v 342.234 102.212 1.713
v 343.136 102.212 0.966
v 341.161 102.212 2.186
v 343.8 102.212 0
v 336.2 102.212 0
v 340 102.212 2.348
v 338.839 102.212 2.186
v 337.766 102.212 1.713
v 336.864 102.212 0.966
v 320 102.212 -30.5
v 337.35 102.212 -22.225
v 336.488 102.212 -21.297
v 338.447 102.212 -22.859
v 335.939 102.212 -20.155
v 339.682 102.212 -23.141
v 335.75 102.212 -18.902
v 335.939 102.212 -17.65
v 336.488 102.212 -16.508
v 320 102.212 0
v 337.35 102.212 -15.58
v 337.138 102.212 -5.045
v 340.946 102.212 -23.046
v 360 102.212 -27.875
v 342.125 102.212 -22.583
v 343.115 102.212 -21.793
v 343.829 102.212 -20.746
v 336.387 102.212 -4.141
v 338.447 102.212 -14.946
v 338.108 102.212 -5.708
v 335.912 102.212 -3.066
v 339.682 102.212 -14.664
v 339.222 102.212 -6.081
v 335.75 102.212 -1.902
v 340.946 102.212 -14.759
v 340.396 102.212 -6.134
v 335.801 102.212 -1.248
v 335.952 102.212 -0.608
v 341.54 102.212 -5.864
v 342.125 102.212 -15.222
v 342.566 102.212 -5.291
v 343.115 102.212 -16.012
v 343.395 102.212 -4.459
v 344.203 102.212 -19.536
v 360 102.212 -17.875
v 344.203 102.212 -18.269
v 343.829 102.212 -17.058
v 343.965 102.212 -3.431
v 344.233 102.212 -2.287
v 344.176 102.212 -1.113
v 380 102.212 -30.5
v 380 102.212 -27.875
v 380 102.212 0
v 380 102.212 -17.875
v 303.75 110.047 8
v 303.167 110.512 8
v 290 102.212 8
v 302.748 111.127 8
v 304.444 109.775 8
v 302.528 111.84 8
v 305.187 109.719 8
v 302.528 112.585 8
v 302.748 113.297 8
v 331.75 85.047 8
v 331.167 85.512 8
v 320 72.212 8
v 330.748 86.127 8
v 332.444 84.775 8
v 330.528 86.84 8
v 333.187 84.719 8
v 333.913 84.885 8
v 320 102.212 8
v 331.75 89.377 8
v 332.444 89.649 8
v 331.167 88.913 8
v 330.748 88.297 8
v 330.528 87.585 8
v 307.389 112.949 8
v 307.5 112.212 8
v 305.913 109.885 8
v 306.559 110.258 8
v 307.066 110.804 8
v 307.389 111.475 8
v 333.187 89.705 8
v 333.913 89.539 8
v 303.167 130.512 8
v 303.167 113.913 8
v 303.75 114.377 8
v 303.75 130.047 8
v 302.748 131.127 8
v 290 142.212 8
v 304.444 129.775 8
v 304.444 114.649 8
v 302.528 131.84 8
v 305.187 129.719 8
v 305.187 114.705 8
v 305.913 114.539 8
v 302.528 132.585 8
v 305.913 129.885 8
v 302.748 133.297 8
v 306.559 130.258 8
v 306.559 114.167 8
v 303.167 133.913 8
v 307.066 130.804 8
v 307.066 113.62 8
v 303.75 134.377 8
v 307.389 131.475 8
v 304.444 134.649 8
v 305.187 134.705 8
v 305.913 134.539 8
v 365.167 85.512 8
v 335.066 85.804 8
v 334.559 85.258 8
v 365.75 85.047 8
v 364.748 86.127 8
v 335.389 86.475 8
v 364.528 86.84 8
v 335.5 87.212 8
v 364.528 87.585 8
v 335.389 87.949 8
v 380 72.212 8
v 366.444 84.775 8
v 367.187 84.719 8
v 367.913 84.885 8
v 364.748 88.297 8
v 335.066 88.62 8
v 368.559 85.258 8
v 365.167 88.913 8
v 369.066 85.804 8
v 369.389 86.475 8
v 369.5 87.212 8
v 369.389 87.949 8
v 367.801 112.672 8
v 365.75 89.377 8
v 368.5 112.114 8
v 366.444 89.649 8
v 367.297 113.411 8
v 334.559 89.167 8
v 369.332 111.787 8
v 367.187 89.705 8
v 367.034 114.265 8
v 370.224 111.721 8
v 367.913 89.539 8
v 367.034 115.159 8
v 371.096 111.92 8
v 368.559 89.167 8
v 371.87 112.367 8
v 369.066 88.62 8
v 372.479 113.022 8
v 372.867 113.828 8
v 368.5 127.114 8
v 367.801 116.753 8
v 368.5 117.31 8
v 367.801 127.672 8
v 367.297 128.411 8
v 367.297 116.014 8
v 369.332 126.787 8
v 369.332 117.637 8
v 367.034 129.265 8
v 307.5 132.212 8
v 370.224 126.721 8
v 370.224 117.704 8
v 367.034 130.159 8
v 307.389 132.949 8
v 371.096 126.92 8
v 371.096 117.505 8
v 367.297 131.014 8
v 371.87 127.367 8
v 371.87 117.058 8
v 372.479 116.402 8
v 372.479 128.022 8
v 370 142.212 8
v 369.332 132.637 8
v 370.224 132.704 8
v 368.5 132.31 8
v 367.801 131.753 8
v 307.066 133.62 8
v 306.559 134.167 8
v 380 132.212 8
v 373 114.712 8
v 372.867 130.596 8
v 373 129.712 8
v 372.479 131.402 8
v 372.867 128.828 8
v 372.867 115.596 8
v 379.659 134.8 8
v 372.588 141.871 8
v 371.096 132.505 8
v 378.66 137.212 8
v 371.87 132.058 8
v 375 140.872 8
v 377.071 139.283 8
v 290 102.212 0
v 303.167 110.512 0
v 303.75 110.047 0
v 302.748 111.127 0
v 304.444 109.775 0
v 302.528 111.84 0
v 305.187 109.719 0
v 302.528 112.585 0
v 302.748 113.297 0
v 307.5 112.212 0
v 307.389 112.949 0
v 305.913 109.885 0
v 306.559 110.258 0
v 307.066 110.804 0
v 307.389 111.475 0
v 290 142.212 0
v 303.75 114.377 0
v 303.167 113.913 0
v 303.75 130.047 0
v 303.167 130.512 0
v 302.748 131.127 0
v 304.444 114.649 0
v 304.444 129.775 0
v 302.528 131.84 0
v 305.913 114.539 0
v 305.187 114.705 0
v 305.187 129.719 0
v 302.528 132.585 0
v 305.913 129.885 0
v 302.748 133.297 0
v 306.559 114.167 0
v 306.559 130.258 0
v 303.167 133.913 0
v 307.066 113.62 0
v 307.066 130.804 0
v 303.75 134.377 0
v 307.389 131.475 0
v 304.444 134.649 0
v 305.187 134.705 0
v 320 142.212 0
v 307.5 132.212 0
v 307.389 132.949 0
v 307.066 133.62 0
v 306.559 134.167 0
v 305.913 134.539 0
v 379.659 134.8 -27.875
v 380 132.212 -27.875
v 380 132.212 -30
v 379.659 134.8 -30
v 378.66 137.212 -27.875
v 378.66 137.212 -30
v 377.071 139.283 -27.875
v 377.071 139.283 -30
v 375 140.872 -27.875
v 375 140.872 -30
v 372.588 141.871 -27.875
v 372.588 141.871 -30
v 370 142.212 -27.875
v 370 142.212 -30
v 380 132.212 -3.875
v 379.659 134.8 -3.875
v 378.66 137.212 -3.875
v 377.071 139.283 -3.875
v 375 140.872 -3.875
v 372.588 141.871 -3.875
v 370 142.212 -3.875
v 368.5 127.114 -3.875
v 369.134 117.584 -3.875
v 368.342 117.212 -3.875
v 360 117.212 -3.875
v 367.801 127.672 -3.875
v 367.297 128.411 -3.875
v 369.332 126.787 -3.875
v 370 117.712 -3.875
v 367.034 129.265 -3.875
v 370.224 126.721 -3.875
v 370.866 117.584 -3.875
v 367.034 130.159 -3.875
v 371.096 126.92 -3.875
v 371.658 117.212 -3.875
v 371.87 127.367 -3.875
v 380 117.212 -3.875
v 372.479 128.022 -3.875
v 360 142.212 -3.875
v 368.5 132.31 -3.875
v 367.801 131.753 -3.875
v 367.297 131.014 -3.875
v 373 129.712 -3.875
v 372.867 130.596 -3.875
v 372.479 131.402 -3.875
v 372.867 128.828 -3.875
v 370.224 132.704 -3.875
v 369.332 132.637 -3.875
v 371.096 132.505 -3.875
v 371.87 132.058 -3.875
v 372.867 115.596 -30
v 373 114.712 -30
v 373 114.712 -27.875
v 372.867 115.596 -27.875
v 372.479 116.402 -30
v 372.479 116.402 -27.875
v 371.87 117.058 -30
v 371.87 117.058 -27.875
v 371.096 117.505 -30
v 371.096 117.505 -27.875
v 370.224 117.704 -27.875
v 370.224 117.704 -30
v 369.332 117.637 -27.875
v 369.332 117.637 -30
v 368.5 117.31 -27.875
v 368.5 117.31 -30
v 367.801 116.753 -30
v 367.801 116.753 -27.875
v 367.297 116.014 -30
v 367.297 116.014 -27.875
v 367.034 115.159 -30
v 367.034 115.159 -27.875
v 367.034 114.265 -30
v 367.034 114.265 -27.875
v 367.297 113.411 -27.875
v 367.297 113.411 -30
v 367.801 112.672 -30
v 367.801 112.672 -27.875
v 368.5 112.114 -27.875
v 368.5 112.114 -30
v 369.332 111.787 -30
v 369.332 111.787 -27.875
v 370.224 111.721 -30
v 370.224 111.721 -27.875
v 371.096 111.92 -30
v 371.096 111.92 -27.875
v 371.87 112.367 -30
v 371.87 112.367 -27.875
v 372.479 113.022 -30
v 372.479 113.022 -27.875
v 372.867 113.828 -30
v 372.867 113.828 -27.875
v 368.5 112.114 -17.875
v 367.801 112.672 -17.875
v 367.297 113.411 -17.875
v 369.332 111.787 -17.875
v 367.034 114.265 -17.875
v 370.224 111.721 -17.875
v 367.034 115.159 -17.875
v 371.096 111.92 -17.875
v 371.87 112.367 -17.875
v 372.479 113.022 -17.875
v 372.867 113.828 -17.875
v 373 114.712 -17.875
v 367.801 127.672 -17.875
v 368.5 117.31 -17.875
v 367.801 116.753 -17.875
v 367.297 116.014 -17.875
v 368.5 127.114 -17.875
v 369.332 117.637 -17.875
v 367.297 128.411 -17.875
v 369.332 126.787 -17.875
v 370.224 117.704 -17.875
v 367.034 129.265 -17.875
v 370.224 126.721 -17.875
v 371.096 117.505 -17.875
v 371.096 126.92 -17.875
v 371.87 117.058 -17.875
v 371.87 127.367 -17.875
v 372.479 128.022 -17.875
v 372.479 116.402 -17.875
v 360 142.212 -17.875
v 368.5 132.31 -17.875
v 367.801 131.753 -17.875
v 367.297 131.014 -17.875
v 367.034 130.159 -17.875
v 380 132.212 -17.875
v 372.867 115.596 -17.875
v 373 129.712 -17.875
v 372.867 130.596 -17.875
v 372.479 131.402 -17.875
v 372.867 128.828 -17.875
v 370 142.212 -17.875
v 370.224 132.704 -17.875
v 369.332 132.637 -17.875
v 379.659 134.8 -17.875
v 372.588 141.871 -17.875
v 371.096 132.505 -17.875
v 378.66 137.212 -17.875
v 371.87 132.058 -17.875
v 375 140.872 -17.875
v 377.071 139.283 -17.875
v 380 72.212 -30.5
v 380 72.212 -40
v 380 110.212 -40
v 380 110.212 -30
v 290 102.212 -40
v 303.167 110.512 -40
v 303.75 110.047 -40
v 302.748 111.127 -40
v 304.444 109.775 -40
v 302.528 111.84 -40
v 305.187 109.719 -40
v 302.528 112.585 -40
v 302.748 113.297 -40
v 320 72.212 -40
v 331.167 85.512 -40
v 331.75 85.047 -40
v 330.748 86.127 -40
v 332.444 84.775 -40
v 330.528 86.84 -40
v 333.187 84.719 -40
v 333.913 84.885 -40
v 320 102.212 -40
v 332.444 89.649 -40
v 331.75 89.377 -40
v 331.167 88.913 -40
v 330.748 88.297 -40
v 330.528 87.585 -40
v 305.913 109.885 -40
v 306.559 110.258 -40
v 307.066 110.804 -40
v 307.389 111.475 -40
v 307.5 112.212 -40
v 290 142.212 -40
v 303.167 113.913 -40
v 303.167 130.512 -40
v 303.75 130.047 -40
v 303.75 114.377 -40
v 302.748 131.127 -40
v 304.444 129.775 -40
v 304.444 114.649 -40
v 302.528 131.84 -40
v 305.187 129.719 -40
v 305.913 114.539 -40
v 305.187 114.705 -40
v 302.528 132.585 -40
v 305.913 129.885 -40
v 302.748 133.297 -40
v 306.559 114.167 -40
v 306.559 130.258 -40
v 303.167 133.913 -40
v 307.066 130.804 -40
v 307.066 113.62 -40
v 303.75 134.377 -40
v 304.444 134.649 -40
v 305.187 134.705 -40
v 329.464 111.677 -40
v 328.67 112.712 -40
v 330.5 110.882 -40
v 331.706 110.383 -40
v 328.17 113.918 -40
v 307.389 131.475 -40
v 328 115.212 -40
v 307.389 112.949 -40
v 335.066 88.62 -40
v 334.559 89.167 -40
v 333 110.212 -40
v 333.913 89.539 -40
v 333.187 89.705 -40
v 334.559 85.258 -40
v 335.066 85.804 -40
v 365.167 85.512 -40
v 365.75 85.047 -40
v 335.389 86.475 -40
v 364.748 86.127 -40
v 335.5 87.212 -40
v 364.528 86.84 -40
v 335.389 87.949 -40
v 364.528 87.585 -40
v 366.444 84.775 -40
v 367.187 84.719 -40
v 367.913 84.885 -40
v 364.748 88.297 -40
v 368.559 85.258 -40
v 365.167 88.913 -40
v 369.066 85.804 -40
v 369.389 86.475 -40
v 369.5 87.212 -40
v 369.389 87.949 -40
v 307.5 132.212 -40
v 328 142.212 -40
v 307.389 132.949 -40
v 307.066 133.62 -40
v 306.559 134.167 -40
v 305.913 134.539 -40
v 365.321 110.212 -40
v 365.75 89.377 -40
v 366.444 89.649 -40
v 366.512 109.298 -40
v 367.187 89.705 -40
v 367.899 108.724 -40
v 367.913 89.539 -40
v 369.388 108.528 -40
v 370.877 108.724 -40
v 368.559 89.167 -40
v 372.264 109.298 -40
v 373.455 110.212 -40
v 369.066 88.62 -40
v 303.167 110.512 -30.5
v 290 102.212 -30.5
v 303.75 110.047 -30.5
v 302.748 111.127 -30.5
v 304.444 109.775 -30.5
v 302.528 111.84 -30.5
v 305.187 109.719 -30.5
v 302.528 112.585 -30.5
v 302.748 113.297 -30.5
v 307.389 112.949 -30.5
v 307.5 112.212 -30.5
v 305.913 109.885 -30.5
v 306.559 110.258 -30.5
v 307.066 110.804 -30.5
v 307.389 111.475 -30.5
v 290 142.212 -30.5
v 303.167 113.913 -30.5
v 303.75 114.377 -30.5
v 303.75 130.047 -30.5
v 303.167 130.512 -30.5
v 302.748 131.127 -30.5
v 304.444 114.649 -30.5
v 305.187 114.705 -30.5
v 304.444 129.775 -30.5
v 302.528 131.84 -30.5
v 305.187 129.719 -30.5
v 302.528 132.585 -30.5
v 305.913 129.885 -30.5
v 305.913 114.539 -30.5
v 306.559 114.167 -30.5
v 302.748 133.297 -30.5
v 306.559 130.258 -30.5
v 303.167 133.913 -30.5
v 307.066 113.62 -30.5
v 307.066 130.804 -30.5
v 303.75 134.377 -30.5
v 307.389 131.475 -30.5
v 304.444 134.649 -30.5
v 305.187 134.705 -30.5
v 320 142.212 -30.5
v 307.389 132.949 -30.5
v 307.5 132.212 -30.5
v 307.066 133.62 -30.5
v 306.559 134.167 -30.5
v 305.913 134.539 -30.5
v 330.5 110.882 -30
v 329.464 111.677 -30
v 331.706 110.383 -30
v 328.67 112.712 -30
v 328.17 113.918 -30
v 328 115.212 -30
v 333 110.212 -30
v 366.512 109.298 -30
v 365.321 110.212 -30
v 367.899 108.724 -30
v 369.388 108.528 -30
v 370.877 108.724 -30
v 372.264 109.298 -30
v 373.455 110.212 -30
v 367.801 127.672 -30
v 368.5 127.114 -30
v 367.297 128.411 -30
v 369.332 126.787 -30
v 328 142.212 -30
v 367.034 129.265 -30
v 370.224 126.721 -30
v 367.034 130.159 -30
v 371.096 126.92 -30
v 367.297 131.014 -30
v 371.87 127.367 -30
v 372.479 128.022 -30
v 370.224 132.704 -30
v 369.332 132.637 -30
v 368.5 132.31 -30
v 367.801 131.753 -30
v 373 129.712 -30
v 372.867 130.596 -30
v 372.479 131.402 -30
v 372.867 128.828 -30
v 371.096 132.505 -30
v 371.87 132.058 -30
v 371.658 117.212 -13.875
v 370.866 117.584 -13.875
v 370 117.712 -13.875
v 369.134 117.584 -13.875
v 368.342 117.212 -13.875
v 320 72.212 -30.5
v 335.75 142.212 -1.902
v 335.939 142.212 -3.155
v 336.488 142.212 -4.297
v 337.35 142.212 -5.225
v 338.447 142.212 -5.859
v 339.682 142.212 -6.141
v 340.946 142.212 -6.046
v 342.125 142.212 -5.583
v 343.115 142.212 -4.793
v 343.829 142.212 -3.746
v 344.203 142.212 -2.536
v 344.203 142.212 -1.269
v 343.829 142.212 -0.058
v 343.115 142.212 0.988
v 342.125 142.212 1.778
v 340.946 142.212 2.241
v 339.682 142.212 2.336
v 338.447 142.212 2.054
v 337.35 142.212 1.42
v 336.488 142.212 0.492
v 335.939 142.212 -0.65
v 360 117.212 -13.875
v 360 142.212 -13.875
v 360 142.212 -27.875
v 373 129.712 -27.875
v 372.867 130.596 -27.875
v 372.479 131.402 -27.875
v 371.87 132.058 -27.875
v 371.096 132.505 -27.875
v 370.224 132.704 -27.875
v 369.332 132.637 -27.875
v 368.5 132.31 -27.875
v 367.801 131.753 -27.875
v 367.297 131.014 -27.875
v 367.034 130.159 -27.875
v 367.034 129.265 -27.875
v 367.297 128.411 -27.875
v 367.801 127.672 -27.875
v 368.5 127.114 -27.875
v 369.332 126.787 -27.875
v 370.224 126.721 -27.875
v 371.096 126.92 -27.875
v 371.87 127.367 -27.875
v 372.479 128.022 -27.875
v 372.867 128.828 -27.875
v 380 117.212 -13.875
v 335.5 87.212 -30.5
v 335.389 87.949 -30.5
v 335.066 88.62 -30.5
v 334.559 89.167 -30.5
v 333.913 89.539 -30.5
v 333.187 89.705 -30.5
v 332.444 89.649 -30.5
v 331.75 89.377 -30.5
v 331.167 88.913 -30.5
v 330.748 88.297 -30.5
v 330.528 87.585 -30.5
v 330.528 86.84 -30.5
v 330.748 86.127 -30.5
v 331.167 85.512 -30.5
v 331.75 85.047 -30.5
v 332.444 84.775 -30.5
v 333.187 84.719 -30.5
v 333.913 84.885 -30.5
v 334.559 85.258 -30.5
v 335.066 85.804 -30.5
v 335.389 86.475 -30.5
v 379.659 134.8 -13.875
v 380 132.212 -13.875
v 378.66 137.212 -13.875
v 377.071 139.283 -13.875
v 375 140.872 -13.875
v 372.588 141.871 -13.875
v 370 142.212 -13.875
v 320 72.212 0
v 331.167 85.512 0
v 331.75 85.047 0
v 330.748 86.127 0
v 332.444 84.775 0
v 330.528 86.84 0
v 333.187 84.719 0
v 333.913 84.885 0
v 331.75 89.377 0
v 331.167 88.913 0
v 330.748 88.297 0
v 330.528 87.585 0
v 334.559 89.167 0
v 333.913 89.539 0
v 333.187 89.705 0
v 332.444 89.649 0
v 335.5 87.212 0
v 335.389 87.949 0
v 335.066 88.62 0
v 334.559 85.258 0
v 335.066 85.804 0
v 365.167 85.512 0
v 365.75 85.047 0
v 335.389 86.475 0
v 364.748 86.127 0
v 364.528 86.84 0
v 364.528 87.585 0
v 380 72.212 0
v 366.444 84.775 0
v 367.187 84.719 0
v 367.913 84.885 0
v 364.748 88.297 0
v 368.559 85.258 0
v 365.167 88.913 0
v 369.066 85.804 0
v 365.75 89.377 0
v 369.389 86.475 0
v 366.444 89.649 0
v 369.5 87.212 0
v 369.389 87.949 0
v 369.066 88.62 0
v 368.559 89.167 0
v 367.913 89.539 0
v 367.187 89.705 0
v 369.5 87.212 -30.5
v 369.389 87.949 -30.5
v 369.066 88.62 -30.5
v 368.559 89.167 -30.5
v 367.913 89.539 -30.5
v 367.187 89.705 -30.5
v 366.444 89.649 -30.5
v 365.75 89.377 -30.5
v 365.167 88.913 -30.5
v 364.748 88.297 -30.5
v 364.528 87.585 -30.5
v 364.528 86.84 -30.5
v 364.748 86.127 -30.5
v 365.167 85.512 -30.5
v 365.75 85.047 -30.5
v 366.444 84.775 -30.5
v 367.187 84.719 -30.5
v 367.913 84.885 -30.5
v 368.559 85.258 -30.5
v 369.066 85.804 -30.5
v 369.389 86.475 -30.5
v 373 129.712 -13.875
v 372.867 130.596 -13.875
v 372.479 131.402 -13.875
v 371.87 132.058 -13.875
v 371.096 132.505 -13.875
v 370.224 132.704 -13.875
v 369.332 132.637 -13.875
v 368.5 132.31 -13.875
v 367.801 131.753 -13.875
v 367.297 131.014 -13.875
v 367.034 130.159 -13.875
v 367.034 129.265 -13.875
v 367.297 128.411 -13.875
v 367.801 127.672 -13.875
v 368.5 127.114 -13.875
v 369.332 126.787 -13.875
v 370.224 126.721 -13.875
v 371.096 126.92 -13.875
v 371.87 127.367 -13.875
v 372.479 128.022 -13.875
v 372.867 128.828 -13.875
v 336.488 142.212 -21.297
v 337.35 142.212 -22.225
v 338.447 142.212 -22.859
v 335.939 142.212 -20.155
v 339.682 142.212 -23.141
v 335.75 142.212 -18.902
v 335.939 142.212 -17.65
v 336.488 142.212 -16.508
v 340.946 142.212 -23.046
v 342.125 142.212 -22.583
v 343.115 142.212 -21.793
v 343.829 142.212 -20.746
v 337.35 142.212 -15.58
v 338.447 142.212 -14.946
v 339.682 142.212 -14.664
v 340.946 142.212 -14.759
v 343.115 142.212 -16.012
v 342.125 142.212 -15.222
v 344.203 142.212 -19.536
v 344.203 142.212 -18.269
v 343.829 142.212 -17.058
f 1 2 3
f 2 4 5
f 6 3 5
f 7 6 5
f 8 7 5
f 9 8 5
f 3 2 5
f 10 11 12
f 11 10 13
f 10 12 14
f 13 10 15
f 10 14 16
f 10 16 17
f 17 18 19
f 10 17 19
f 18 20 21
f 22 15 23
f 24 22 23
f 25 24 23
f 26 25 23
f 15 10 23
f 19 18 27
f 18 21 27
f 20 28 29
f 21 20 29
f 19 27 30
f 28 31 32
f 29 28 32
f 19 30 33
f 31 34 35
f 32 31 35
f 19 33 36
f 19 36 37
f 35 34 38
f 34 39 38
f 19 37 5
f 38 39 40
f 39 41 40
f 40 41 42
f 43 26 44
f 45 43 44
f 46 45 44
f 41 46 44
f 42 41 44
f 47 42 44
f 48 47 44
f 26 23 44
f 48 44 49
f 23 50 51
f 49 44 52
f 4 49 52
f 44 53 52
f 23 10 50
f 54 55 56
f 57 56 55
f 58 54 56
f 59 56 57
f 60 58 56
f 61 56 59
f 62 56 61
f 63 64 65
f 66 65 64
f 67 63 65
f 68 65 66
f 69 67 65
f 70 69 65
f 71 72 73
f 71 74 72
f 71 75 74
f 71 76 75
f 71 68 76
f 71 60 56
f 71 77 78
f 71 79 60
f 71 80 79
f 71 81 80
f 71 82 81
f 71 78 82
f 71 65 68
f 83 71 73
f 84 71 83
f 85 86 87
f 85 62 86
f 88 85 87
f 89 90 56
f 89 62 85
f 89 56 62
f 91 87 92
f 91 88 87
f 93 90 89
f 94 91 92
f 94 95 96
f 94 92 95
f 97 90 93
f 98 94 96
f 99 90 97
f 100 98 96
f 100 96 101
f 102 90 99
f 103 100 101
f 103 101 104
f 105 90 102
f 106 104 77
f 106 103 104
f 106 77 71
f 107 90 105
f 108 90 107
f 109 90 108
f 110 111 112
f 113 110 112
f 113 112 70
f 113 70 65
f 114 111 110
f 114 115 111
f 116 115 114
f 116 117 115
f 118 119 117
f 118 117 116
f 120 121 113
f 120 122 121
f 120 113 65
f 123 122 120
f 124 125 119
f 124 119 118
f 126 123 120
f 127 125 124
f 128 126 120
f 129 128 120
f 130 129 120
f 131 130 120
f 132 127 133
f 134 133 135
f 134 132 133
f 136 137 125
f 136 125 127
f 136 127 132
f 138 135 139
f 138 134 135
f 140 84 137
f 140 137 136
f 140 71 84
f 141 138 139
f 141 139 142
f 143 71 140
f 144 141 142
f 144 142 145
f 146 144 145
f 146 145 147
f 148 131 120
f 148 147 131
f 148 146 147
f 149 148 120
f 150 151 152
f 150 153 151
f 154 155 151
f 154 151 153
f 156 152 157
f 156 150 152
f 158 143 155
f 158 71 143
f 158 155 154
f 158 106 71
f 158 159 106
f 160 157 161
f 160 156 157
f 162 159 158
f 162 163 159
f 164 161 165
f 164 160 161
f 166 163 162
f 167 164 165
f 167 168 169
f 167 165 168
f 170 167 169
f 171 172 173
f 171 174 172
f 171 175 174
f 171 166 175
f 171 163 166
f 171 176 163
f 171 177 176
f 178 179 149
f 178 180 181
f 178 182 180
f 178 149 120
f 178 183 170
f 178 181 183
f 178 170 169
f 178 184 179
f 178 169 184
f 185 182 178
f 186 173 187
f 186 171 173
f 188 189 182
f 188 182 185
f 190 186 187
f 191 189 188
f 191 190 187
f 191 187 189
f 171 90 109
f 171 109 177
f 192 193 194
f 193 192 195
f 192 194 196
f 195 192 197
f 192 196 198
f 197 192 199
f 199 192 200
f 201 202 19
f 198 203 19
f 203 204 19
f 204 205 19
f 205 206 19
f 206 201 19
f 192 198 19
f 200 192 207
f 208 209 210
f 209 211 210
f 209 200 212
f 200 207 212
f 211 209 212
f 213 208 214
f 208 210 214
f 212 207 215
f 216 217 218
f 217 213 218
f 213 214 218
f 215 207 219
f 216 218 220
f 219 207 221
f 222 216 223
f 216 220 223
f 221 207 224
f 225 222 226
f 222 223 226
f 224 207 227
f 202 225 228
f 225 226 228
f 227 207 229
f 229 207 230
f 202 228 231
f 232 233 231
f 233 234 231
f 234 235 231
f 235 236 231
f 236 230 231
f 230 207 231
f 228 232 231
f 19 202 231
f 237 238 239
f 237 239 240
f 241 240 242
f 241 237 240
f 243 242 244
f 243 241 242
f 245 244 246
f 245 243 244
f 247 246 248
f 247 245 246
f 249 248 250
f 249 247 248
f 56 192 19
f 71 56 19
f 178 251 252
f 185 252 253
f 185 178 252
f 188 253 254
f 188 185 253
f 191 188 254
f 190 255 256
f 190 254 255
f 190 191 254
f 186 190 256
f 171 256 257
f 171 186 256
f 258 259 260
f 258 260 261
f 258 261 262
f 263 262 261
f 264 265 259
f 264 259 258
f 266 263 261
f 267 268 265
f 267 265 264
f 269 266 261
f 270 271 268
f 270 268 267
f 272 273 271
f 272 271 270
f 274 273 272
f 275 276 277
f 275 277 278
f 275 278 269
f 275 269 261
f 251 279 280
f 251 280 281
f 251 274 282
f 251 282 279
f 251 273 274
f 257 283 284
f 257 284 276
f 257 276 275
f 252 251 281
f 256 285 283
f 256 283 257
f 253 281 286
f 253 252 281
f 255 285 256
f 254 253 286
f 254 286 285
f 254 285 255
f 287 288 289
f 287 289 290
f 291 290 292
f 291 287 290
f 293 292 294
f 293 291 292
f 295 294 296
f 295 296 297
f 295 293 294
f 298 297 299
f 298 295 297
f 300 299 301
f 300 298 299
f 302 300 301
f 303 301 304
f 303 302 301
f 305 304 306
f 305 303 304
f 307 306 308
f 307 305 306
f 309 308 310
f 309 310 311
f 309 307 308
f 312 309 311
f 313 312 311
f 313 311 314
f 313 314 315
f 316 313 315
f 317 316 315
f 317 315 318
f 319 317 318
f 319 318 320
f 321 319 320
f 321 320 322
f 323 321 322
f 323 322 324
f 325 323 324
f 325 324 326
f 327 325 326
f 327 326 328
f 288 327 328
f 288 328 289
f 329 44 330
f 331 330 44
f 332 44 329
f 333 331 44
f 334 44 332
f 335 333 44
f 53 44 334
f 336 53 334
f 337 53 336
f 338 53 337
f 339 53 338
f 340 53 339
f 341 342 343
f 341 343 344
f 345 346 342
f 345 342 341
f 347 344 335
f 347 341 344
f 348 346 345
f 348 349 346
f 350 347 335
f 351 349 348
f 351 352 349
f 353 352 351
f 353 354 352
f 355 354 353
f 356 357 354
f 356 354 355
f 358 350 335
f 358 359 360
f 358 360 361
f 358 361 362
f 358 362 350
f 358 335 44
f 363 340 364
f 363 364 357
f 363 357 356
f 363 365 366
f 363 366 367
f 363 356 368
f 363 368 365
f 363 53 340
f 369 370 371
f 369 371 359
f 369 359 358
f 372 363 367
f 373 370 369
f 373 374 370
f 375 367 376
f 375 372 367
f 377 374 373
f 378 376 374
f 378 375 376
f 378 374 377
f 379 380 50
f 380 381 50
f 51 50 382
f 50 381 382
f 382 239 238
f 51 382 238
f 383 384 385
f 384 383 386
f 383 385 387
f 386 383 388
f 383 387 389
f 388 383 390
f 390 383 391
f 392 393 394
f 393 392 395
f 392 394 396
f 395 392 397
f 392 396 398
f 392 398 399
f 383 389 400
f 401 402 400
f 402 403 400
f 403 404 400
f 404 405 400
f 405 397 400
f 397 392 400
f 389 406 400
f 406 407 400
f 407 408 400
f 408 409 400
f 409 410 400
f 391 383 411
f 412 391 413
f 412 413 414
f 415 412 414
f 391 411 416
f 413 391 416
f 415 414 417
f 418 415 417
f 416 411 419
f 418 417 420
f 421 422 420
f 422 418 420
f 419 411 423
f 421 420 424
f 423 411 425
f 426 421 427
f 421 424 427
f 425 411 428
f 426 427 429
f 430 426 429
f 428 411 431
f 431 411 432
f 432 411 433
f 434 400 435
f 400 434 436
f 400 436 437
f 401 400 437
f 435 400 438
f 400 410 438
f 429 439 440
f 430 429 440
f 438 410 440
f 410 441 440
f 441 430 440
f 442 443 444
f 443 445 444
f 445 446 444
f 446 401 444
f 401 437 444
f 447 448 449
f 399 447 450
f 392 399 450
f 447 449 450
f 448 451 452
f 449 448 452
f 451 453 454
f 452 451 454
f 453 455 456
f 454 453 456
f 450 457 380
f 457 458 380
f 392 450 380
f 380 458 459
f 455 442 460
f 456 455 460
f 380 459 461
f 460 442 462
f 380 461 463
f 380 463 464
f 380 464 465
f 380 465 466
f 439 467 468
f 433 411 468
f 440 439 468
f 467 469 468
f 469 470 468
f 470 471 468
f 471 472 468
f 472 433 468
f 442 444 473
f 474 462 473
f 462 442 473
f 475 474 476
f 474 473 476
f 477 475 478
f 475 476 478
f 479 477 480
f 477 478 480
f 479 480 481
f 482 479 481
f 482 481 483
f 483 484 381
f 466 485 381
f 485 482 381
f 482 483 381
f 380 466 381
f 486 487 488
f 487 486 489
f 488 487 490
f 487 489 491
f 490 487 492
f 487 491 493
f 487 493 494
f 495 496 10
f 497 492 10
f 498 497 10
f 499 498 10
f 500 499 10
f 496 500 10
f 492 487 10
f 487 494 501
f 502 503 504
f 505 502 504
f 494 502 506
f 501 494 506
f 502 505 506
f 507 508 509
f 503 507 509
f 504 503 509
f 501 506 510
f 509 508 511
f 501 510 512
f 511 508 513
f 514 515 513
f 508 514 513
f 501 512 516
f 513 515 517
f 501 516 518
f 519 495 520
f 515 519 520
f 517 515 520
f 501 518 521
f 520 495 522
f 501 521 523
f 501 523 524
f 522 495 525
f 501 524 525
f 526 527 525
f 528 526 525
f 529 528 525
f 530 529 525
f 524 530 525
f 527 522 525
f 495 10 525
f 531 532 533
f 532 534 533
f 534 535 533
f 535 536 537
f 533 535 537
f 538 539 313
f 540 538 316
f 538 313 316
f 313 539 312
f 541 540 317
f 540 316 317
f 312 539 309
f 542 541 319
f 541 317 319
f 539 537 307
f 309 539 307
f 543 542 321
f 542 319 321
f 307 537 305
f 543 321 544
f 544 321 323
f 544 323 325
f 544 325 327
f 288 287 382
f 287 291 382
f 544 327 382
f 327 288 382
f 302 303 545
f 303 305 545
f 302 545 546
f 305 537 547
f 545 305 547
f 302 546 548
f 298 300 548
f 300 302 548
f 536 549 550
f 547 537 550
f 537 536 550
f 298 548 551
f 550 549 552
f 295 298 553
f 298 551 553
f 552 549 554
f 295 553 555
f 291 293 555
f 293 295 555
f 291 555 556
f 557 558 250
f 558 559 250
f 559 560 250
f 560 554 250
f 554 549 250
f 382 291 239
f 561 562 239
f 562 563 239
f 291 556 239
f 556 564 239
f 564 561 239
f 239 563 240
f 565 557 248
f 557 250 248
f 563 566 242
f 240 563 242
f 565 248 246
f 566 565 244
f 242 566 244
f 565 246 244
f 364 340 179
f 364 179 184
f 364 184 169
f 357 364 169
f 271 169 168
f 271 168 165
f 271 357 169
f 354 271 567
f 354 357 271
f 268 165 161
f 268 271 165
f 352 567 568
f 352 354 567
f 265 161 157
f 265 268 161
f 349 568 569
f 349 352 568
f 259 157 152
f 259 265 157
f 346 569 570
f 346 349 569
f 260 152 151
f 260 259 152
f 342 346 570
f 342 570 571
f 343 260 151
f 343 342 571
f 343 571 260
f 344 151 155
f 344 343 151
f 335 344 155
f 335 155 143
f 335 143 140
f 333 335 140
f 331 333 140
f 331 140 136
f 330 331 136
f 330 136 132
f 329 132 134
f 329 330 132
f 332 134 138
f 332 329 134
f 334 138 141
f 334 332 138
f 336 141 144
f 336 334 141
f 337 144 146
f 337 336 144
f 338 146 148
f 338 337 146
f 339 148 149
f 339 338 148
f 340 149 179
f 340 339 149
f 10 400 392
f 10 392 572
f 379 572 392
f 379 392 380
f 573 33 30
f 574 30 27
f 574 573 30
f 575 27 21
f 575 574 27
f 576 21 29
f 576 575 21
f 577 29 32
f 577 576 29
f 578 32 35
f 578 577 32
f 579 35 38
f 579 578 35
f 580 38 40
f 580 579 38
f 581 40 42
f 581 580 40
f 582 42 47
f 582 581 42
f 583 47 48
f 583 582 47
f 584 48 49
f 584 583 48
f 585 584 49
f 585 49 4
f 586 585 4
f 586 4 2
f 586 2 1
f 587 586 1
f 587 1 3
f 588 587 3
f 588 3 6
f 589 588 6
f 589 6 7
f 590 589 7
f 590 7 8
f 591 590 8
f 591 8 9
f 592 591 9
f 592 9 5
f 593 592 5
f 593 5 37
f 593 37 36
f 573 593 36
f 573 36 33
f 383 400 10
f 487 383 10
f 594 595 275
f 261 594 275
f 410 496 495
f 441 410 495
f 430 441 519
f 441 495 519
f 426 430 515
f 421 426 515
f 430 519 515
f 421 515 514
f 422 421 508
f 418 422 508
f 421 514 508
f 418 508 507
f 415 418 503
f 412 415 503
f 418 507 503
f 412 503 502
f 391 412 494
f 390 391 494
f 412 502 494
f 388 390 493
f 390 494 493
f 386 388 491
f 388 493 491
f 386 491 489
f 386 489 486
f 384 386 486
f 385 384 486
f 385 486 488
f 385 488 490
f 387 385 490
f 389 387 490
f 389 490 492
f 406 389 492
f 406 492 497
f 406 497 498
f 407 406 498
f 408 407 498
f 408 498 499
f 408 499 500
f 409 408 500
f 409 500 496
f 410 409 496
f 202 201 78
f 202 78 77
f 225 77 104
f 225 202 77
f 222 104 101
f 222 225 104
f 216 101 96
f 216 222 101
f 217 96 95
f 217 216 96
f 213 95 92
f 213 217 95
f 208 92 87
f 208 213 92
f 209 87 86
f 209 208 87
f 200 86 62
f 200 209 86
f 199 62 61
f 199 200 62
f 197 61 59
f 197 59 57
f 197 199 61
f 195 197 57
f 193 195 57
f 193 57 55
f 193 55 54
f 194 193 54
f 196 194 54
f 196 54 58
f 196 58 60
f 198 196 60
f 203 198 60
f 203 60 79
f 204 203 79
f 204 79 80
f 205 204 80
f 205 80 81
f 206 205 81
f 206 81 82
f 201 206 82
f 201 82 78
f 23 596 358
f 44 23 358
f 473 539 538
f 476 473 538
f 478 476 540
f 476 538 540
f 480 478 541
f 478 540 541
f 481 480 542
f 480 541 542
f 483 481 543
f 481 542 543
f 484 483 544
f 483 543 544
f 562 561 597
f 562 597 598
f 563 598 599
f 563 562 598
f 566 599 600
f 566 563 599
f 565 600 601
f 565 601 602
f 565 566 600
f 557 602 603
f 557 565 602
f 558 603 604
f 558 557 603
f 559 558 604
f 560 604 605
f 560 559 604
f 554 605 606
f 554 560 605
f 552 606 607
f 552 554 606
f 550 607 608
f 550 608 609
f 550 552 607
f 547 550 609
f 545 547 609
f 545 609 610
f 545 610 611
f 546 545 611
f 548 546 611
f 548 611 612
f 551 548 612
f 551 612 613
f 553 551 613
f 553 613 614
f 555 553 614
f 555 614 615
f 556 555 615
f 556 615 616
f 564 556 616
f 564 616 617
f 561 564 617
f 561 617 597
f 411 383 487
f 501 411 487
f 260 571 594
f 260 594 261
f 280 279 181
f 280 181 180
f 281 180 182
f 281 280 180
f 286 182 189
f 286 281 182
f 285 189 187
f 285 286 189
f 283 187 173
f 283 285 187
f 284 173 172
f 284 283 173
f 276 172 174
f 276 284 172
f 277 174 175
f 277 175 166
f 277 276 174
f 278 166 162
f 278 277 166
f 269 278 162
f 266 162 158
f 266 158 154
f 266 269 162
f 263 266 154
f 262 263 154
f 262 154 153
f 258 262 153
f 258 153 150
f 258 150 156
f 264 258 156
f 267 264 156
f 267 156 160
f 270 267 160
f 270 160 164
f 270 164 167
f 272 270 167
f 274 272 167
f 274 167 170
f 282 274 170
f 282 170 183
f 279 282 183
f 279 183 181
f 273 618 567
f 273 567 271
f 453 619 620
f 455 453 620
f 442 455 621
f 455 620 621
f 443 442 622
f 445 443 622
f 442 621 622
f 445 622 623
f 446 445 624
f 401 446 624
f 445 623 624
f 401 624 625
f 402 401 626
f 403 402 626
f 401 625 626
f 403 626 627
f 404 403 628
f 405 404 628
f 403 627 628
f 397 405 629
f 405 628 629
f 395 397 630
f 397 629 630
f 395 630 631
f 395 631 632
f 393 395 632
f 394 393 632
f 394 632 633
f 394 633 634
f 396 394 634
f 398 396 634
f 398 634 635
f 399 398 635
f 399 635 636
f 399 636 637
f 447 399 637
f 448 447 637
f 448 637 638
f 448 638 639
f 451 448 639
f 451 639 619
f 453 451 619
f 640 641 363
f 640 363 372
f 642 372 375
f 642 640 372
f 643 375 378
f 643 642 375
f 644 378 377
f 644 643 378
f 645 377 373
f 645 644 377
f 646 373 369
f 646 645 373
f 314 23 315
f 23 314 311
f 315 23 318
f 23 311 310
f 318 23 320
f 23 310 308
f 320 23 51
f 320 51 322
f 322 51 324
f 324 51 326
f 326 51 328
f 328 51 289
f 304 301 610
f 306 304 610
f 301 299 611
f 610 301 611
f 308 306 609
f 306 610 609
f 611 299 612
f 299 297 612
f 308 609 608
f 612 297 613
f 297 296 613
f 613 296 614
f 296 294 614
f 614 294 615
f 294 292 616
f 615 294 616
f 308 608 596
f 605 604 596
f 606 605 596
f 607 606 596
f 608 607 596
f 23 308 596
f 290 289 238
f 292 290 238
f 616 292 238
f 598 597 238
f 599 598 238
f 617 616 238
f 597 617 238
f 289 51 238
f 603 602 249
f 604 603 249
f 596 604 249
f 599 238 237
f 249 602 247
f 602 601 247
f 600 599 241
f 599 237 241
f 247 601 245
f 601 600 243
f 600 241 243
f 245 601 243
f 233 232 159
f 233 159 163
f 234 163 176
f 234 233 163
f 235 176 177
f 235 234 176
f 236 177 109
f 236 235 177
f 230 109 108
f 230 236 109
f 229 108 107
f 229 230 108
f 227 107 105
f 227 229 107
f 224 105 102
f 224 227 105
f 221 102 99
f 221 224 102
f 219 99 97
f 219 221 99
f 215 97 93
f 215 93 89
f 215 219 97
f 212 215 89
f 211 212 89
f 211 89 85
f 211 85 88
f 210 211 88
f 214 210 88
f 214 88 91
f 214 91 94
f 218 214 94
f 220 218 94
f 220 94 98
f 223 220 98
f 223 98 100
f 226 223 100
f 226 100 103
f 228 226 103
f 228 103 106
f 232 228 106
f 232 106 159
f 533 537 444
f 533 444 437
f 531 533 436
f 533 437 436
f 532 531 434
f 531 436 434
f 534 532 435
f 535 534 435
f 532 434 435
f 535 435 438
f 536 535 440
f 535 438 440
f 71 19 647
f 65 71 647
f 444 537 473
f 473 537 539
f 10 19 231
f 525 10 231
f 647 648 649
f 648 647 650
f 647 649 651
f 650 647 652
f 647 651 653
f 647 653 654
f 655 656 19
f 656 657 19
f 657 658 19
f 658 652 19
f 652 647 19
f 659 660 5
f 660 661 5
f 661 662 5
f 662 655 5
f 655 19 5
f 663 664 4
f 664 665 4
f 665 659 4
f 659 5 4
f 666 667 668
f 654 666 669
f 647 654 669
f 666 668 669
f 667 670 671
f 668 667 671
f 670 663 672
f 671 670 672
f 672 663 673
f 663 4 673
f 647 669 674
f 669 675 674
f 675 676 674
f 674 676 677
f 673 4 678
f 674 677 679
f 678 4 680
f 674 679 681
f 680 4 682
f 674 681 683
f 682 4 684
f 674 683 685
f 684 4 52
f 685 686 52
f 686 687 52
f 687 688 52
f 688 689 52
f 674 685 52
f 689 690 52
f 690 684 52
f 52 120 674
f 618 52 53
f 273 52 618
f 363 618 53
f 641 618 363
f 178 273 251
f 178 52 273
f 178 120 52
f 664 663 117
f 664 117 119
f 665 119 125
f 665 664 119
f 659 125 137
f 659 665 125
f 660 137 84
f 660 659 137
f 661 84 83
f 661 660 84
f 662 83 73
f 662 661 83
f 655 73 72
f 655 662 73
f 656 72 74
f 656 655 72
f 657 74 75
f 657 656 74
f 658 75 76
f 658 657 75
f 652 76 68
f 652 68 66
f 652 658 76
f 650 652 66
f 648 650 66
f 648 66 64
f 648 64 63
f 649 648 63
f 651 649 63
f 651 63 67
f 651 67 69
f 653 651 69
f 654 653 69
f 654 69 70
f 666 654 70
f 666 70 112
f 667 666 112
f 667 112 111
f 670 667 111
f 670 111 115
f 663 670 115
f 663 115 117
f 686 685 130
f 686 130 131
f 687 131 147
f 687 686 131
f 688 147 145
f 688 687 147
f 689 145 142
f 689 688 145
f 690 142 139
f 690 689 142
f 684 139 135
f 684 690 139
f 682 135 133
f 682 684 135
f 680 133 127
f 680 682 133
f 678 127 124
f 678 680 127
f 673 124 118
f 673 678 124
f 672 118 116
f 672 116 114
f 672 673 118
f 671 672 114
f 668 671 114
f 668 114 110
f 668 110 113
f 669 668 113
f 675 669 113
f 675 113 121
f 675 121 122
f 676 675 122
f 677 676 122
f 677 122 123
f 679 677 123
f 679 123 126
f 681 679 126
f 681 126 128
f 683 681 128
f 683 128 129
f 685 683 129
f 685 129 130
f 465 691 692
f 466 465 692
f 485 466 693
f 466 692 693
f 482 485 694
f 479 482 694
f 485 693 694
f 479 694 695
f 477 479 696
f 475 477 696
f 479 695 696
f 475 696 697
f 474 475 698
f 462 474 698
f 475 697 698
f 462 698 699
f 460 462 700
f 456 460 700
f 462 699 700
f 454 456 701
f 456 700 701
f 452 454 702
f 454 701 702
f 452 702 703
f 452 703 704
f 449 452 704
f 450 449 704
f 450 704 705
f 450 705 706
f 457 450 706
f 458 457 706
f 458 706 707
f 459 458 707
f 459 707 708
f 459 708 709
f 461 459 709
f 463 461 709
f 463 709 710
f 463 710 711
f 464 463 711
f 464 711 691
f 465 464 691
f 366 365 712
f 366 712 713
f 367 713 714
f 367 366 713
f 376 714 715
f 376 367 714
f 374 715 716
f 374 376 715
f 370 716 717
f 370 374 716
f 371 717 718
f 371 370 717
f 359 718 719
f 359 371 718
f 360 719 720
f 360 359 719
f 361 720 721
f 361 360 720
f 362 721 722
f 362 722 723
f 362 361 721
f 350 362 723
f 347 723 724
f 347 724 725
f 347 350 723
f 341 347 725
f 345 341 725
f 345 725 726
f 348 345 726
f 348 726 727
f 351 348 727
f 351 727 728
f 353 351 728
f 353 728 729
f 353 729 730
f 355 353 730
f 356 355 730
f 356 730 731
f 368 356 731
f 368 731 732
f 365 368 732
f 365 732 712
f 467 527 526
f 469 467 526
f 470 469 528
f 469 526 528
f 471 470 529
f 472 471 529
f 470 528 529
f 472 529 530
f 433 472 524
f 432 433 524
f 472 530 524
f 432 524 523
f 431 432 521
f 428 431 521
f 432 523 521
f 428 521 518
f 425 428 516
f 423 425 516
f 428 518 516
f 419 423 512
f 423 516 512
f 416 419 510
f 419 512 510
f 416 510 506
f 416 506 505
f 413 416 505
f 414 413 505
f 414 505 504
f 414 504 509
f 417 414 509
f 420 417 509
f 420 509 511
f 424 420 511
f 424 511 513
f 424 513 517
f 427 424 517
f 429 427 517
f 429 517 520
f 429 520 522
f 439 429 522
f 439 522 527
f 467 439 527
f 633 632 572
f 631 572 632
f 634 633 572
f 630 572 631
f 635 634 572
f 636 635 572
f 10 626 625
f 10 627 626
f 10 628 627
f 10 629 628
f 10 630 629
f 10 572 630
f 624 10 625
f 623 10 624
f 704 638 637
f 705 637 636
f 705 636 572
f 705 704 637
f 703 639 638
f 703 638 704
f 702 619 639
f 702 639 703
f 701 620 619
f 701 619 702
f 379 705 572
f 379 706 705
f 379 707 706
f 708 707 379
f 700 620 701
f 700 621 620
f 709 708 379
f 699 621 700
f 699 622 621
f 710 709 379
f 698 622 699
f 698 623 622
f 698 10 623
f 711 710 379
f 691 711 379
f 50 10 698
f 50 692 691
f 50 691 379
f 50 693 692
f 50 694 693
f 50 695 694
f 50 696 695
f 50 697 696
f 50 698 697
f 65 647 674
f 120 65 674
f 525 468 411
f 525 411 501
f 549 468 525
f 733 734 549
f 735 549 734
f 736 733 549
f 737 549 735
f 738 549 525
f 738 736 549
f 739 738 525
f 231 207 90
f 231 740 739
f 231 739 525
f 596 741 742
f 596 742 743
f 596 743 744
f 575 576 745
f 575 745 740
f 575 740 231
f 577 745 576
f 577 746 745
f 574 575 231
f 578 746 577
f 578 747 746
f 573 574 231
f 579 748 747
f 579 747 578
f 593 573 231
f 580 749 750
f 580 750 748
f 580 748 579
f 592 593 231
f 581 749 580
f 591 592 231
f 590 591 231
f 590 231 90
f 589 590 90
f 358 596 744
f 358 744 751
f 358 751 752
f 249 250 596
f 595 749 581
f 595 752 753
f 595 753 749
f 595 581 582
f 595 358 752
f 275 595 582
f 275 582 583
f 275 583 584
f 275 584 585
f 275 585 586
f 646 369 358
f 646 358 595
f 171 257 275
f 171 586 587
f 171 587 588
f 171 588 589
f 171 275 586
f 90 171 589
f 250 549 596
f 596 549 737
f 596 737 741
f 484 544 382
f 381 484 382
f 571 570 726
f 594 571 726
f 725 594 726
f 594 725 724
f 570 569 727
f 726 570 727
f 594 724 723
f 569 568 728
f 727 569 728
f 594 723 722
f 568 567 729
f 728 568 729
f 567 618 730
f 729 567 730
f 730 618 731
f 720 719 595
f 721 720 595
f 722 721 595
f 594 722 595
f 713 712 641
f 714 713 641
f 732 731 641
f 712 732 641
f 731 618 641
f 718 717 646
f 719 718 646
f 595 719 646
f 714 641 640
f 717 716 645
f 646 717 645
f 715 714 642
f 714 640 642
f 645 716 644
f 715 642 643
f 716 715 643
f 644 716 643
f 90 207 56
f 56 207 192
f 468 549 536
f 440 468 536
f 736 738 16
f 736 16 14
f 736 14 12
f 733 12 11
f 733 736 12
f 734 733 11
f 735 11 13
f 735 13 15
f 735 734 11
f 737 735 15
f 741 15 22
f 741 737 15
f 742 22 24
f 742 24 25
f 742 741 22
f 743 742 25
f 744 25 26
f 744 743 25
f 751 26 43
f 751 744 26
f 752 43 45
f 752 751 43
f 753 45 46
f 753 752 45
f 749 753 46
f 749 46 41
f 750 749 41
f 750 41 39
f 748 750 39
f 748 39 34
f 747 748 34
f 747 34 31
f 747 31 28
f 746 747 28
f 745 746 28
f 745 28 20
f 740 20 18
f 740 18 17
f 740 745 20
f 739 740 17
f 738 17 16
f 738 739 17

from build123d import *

# Parameters (mm, degrees)
RESSALTO_EXTRUS_O1_DEPTH                   = 8
BROCA_DE_ROSQUEAR_PARA_TARRAXA_DE_M6X1_0_D = 5
RESSALTO_EXTRUS_O2_DEPTH                   = 30
ESBO_O6_W                                  = 10
ESBO_O6_H                                  = 40
ESBO_O6_H_2                                = 25
CORTE_EXTRUS_O2_DEPTH                      = 20
ESBO_O14_R                                 = 3
CORTE_EXTRUS_O6_DEPTH                      = 39
ESBO_O15_R                                 = 4.25
CORTE_EXTRUS_O7_DEPTH                      = 40
RESSALTO_EXTRUS_O3_DEPTH                   = 10
ESBO_O17_W                                 = 9.5
ESBO_O17_H                                 = 40
RESSALTO_EXTRUS_O4_DEPTH                   = 30
ESBO_O18_R                                 = 2.5
CORTE_EXTRUS_O8_DEPTH                      = 10
ESBO_O19_W                                 = 60
ESBO_O19_H                                 = 9.5
RESSALTO_EXTRUS_O5_DEPTH                   = 30
FILETE1_R                                  = 5
ESBO_O20_R                                 = 2.5
CORTE_EXTRUS_O9_DEPTH                      = 10


with BuildPart() as part:
    # Esboço1 → Ressalto-extrusão1 (new body)
    with BuildSketch(Plane.XY):
        with BuildLine():
            Line((440, 72.212171493), (380, 72.212171493))
            Line((380, 72.212171493), (380, 132.212171493))
            ThreePointArc((380, 132.212171493), (382.928932188, 139.283239304), (390, 142.212171493))
            Line((390, 142.212171493), (470, 142.212171493))
            Line((470, 142.212171493), (470, 102.212171493))
            Line((470, 102.212171493), (440, 102.212171493))
            Line((440, 102.212171493), (440, 72.212171493))
        make_face()
    extrude(amount=RESSALTO_EXTRUS_O1_DEPTH)

    # Broca de rosquear para tarraxa de M6x1.01 (through all)
    with Locations(Plane.XY.offset(8)):
        with Locations((393, 87.212171493), (427, 87.212171493), (455, 112.212171493), (455, 132.212171493)):
            Hole(BROCA_DE_ROSQUEAR_PARA_TARRAXA_DE_M6X1_0_D / 2)

    # Esboço4 → Ressalto-extrusão2 (add)
    with BuildSketch(Plane(origin=(0, 0, 0), x_dir=(-1, 0, 0), z_dir=(0, 0, -1))):
        with BuildLine():
            Line((-390, 142.212171493), (-440, 142.212171493))
            Line((-440, 142.212171493), (-440, 102.212171493))
            Line((-440, 102.212171493), (-380, 102.212171493))
            Line((-380, 102.212171493), (-380, 132.212171493))
            ThreePointArc((-380, 132.212171493), (-382.928932188, 139.283239304), (-390, 142.212171493))
        make_face()
    extrude(amount=RESSALTO_EXTRUS_O2_DEPTH)

    # Esboço6 → Corte-extrusão2 (cut)
    with BuildSketch(Plane.ZY.offset(-380)):
        with Locations((-22.874860756, 122.212171493)):
            Rectangle(ESBO_O6_W, ESBO_O6_H)
        with Locations((-8.874860756, 129.712171493)):
            Rectangle(ESBO_O6_W, ESBO_O6_H_2)
    extrude(amount=-CORTE_EXTRUS_O2_DEPTH, mode=Mode.SUBTRACT)

    # Esboço14 → Corte-extrusão6 (cut, through all)
    with BuildSketch(Plane(origin=(0, 0, -30), x_dir=(-1, 0, 0), z_dir=(0, 0, -1))):
        with Locations((-390, 129.712171493)):
            Circle(ESBO_O14_R)
        with Locations((-390, 114.712171493)):
            Circle(ESBO_O14_R)
    extrude(amount=-CORTE_EXTRUS_O6_DEPTH, mode=Mode.SUBTRACT)

    # Esboço15 → Corte-extrusão7 (cut)
    with BuildSketch(Plane(origin=(0, 142.212171493, 0), x_dir=(1, 0, 0), z_dir=(0, 1, 0))):
        with Locations((420, 18.90241208)):
            Circle(ESBO_O15_R)
        with Locations((420, 1.90241208)):
            Circle(ESBO_O15_R)
    extrude(amount=-CORTE_EXTRUS_O7_DEPTH, mode=Mode.SUBTRACT)


with BuildPart() as body_2:
    # Espelhar1: mirrored copy
    add(part.part.mirror(Plane(origin=(380, 72.212171493, 8), x_dir=(0, 0, 1), z_dir=(-1, 0, 0))))

    # Esboço16 → Ressalto-extrusão3 (add)
    with BuildSketch(Plane(origin=(0, 0, -30), x_dir=(-1, 0, 0), z_dir=(0, 0, -1))):
        with BuildLine():
            Line((-320, 142.212171493), (-328, 142.212171493))
            Line((-328, 142.212171493), (-328, 110.212171493))
            Line((-328, 110.212171493), (-365.320990692, 110.212171493))
            ThreePointArc((-365.320990692, 110.212171493), (-369.387979043, 108.52756976), (-373.454967393, 110.212171493))
            Line((-373.454967393, 110.212171493), (-380, 110.212171493))
            Line((-380, 110.212171493), (-380, 102.212171493))
            Line((-380, 102.212171493), (-328, 102.212171493))
            Line((-328, 102.212171493), (-320, 102.212171493))
            Line((-320, 102.212171493), (-320, 142.212171493))
        make_face()
    extrude(amount=RESSALTO_EXTRUS_O3_DEPTH)

    # Esboço17 → Ressalto-extrusão4 (add, through all)
    with BuildSketch(Plane.ZY.offset(-320)):
        with Locations((-35.25, 122.212171493)):
            Rectangle(ESBO_O17_W, ESBO_O17_H)
    extrude(amount=RESSALTO_EXTRUS_O4_DEPTH)

    # Esboço18 → Corte-extrusão8 (cut)
    with BuildSketch(Plane.XY.offset(-30.5)):
        with Locations((305, 112.212171493)):
            Circle(ESBO_O18_R)
        with Locations((305, 132.212171493)):
            Circle(ESBO_O18_R)
    extrude(amount=-CORTE_EXTRUS_O8_DEPTH, mode=Mode.SUBTRACT)

    # Esboço19 → Ressalto-extrusão5 (add, through all)
    with BuildSketch(Plane.XZ.offset(-102.212171493)):
        with Locations((350, -35.25)):
            Rectangle(ESBO_O19_W, ESBO_O19_H)
    extrude(amount=RESSALTO_EXTRUS_O5_DEPTH)

    # Filete1
    filete1_edges = [body_2.edges().sort_by_distance(p)[0] for p in [
        (328, 110.212171493, -35),
    ]]
    fillet(filete1_edges, radius=FILETE1_R)

    # Esboço20 → Corte-extrusão9 (cut)
    with BuildSketch(Plane.XY.offset(-30.5)):
        with Locations((367, 87.212171493)):
            Circle(ESBO_O20_R)
        with Locations((333, 87.212171493)):
            Circle(ESBO_O20_R)
    extrude(amount=-CORTE_EXTRUS_O9_DEPTH, mode=Mode.SUBTRACT)


solid = body_2.part
